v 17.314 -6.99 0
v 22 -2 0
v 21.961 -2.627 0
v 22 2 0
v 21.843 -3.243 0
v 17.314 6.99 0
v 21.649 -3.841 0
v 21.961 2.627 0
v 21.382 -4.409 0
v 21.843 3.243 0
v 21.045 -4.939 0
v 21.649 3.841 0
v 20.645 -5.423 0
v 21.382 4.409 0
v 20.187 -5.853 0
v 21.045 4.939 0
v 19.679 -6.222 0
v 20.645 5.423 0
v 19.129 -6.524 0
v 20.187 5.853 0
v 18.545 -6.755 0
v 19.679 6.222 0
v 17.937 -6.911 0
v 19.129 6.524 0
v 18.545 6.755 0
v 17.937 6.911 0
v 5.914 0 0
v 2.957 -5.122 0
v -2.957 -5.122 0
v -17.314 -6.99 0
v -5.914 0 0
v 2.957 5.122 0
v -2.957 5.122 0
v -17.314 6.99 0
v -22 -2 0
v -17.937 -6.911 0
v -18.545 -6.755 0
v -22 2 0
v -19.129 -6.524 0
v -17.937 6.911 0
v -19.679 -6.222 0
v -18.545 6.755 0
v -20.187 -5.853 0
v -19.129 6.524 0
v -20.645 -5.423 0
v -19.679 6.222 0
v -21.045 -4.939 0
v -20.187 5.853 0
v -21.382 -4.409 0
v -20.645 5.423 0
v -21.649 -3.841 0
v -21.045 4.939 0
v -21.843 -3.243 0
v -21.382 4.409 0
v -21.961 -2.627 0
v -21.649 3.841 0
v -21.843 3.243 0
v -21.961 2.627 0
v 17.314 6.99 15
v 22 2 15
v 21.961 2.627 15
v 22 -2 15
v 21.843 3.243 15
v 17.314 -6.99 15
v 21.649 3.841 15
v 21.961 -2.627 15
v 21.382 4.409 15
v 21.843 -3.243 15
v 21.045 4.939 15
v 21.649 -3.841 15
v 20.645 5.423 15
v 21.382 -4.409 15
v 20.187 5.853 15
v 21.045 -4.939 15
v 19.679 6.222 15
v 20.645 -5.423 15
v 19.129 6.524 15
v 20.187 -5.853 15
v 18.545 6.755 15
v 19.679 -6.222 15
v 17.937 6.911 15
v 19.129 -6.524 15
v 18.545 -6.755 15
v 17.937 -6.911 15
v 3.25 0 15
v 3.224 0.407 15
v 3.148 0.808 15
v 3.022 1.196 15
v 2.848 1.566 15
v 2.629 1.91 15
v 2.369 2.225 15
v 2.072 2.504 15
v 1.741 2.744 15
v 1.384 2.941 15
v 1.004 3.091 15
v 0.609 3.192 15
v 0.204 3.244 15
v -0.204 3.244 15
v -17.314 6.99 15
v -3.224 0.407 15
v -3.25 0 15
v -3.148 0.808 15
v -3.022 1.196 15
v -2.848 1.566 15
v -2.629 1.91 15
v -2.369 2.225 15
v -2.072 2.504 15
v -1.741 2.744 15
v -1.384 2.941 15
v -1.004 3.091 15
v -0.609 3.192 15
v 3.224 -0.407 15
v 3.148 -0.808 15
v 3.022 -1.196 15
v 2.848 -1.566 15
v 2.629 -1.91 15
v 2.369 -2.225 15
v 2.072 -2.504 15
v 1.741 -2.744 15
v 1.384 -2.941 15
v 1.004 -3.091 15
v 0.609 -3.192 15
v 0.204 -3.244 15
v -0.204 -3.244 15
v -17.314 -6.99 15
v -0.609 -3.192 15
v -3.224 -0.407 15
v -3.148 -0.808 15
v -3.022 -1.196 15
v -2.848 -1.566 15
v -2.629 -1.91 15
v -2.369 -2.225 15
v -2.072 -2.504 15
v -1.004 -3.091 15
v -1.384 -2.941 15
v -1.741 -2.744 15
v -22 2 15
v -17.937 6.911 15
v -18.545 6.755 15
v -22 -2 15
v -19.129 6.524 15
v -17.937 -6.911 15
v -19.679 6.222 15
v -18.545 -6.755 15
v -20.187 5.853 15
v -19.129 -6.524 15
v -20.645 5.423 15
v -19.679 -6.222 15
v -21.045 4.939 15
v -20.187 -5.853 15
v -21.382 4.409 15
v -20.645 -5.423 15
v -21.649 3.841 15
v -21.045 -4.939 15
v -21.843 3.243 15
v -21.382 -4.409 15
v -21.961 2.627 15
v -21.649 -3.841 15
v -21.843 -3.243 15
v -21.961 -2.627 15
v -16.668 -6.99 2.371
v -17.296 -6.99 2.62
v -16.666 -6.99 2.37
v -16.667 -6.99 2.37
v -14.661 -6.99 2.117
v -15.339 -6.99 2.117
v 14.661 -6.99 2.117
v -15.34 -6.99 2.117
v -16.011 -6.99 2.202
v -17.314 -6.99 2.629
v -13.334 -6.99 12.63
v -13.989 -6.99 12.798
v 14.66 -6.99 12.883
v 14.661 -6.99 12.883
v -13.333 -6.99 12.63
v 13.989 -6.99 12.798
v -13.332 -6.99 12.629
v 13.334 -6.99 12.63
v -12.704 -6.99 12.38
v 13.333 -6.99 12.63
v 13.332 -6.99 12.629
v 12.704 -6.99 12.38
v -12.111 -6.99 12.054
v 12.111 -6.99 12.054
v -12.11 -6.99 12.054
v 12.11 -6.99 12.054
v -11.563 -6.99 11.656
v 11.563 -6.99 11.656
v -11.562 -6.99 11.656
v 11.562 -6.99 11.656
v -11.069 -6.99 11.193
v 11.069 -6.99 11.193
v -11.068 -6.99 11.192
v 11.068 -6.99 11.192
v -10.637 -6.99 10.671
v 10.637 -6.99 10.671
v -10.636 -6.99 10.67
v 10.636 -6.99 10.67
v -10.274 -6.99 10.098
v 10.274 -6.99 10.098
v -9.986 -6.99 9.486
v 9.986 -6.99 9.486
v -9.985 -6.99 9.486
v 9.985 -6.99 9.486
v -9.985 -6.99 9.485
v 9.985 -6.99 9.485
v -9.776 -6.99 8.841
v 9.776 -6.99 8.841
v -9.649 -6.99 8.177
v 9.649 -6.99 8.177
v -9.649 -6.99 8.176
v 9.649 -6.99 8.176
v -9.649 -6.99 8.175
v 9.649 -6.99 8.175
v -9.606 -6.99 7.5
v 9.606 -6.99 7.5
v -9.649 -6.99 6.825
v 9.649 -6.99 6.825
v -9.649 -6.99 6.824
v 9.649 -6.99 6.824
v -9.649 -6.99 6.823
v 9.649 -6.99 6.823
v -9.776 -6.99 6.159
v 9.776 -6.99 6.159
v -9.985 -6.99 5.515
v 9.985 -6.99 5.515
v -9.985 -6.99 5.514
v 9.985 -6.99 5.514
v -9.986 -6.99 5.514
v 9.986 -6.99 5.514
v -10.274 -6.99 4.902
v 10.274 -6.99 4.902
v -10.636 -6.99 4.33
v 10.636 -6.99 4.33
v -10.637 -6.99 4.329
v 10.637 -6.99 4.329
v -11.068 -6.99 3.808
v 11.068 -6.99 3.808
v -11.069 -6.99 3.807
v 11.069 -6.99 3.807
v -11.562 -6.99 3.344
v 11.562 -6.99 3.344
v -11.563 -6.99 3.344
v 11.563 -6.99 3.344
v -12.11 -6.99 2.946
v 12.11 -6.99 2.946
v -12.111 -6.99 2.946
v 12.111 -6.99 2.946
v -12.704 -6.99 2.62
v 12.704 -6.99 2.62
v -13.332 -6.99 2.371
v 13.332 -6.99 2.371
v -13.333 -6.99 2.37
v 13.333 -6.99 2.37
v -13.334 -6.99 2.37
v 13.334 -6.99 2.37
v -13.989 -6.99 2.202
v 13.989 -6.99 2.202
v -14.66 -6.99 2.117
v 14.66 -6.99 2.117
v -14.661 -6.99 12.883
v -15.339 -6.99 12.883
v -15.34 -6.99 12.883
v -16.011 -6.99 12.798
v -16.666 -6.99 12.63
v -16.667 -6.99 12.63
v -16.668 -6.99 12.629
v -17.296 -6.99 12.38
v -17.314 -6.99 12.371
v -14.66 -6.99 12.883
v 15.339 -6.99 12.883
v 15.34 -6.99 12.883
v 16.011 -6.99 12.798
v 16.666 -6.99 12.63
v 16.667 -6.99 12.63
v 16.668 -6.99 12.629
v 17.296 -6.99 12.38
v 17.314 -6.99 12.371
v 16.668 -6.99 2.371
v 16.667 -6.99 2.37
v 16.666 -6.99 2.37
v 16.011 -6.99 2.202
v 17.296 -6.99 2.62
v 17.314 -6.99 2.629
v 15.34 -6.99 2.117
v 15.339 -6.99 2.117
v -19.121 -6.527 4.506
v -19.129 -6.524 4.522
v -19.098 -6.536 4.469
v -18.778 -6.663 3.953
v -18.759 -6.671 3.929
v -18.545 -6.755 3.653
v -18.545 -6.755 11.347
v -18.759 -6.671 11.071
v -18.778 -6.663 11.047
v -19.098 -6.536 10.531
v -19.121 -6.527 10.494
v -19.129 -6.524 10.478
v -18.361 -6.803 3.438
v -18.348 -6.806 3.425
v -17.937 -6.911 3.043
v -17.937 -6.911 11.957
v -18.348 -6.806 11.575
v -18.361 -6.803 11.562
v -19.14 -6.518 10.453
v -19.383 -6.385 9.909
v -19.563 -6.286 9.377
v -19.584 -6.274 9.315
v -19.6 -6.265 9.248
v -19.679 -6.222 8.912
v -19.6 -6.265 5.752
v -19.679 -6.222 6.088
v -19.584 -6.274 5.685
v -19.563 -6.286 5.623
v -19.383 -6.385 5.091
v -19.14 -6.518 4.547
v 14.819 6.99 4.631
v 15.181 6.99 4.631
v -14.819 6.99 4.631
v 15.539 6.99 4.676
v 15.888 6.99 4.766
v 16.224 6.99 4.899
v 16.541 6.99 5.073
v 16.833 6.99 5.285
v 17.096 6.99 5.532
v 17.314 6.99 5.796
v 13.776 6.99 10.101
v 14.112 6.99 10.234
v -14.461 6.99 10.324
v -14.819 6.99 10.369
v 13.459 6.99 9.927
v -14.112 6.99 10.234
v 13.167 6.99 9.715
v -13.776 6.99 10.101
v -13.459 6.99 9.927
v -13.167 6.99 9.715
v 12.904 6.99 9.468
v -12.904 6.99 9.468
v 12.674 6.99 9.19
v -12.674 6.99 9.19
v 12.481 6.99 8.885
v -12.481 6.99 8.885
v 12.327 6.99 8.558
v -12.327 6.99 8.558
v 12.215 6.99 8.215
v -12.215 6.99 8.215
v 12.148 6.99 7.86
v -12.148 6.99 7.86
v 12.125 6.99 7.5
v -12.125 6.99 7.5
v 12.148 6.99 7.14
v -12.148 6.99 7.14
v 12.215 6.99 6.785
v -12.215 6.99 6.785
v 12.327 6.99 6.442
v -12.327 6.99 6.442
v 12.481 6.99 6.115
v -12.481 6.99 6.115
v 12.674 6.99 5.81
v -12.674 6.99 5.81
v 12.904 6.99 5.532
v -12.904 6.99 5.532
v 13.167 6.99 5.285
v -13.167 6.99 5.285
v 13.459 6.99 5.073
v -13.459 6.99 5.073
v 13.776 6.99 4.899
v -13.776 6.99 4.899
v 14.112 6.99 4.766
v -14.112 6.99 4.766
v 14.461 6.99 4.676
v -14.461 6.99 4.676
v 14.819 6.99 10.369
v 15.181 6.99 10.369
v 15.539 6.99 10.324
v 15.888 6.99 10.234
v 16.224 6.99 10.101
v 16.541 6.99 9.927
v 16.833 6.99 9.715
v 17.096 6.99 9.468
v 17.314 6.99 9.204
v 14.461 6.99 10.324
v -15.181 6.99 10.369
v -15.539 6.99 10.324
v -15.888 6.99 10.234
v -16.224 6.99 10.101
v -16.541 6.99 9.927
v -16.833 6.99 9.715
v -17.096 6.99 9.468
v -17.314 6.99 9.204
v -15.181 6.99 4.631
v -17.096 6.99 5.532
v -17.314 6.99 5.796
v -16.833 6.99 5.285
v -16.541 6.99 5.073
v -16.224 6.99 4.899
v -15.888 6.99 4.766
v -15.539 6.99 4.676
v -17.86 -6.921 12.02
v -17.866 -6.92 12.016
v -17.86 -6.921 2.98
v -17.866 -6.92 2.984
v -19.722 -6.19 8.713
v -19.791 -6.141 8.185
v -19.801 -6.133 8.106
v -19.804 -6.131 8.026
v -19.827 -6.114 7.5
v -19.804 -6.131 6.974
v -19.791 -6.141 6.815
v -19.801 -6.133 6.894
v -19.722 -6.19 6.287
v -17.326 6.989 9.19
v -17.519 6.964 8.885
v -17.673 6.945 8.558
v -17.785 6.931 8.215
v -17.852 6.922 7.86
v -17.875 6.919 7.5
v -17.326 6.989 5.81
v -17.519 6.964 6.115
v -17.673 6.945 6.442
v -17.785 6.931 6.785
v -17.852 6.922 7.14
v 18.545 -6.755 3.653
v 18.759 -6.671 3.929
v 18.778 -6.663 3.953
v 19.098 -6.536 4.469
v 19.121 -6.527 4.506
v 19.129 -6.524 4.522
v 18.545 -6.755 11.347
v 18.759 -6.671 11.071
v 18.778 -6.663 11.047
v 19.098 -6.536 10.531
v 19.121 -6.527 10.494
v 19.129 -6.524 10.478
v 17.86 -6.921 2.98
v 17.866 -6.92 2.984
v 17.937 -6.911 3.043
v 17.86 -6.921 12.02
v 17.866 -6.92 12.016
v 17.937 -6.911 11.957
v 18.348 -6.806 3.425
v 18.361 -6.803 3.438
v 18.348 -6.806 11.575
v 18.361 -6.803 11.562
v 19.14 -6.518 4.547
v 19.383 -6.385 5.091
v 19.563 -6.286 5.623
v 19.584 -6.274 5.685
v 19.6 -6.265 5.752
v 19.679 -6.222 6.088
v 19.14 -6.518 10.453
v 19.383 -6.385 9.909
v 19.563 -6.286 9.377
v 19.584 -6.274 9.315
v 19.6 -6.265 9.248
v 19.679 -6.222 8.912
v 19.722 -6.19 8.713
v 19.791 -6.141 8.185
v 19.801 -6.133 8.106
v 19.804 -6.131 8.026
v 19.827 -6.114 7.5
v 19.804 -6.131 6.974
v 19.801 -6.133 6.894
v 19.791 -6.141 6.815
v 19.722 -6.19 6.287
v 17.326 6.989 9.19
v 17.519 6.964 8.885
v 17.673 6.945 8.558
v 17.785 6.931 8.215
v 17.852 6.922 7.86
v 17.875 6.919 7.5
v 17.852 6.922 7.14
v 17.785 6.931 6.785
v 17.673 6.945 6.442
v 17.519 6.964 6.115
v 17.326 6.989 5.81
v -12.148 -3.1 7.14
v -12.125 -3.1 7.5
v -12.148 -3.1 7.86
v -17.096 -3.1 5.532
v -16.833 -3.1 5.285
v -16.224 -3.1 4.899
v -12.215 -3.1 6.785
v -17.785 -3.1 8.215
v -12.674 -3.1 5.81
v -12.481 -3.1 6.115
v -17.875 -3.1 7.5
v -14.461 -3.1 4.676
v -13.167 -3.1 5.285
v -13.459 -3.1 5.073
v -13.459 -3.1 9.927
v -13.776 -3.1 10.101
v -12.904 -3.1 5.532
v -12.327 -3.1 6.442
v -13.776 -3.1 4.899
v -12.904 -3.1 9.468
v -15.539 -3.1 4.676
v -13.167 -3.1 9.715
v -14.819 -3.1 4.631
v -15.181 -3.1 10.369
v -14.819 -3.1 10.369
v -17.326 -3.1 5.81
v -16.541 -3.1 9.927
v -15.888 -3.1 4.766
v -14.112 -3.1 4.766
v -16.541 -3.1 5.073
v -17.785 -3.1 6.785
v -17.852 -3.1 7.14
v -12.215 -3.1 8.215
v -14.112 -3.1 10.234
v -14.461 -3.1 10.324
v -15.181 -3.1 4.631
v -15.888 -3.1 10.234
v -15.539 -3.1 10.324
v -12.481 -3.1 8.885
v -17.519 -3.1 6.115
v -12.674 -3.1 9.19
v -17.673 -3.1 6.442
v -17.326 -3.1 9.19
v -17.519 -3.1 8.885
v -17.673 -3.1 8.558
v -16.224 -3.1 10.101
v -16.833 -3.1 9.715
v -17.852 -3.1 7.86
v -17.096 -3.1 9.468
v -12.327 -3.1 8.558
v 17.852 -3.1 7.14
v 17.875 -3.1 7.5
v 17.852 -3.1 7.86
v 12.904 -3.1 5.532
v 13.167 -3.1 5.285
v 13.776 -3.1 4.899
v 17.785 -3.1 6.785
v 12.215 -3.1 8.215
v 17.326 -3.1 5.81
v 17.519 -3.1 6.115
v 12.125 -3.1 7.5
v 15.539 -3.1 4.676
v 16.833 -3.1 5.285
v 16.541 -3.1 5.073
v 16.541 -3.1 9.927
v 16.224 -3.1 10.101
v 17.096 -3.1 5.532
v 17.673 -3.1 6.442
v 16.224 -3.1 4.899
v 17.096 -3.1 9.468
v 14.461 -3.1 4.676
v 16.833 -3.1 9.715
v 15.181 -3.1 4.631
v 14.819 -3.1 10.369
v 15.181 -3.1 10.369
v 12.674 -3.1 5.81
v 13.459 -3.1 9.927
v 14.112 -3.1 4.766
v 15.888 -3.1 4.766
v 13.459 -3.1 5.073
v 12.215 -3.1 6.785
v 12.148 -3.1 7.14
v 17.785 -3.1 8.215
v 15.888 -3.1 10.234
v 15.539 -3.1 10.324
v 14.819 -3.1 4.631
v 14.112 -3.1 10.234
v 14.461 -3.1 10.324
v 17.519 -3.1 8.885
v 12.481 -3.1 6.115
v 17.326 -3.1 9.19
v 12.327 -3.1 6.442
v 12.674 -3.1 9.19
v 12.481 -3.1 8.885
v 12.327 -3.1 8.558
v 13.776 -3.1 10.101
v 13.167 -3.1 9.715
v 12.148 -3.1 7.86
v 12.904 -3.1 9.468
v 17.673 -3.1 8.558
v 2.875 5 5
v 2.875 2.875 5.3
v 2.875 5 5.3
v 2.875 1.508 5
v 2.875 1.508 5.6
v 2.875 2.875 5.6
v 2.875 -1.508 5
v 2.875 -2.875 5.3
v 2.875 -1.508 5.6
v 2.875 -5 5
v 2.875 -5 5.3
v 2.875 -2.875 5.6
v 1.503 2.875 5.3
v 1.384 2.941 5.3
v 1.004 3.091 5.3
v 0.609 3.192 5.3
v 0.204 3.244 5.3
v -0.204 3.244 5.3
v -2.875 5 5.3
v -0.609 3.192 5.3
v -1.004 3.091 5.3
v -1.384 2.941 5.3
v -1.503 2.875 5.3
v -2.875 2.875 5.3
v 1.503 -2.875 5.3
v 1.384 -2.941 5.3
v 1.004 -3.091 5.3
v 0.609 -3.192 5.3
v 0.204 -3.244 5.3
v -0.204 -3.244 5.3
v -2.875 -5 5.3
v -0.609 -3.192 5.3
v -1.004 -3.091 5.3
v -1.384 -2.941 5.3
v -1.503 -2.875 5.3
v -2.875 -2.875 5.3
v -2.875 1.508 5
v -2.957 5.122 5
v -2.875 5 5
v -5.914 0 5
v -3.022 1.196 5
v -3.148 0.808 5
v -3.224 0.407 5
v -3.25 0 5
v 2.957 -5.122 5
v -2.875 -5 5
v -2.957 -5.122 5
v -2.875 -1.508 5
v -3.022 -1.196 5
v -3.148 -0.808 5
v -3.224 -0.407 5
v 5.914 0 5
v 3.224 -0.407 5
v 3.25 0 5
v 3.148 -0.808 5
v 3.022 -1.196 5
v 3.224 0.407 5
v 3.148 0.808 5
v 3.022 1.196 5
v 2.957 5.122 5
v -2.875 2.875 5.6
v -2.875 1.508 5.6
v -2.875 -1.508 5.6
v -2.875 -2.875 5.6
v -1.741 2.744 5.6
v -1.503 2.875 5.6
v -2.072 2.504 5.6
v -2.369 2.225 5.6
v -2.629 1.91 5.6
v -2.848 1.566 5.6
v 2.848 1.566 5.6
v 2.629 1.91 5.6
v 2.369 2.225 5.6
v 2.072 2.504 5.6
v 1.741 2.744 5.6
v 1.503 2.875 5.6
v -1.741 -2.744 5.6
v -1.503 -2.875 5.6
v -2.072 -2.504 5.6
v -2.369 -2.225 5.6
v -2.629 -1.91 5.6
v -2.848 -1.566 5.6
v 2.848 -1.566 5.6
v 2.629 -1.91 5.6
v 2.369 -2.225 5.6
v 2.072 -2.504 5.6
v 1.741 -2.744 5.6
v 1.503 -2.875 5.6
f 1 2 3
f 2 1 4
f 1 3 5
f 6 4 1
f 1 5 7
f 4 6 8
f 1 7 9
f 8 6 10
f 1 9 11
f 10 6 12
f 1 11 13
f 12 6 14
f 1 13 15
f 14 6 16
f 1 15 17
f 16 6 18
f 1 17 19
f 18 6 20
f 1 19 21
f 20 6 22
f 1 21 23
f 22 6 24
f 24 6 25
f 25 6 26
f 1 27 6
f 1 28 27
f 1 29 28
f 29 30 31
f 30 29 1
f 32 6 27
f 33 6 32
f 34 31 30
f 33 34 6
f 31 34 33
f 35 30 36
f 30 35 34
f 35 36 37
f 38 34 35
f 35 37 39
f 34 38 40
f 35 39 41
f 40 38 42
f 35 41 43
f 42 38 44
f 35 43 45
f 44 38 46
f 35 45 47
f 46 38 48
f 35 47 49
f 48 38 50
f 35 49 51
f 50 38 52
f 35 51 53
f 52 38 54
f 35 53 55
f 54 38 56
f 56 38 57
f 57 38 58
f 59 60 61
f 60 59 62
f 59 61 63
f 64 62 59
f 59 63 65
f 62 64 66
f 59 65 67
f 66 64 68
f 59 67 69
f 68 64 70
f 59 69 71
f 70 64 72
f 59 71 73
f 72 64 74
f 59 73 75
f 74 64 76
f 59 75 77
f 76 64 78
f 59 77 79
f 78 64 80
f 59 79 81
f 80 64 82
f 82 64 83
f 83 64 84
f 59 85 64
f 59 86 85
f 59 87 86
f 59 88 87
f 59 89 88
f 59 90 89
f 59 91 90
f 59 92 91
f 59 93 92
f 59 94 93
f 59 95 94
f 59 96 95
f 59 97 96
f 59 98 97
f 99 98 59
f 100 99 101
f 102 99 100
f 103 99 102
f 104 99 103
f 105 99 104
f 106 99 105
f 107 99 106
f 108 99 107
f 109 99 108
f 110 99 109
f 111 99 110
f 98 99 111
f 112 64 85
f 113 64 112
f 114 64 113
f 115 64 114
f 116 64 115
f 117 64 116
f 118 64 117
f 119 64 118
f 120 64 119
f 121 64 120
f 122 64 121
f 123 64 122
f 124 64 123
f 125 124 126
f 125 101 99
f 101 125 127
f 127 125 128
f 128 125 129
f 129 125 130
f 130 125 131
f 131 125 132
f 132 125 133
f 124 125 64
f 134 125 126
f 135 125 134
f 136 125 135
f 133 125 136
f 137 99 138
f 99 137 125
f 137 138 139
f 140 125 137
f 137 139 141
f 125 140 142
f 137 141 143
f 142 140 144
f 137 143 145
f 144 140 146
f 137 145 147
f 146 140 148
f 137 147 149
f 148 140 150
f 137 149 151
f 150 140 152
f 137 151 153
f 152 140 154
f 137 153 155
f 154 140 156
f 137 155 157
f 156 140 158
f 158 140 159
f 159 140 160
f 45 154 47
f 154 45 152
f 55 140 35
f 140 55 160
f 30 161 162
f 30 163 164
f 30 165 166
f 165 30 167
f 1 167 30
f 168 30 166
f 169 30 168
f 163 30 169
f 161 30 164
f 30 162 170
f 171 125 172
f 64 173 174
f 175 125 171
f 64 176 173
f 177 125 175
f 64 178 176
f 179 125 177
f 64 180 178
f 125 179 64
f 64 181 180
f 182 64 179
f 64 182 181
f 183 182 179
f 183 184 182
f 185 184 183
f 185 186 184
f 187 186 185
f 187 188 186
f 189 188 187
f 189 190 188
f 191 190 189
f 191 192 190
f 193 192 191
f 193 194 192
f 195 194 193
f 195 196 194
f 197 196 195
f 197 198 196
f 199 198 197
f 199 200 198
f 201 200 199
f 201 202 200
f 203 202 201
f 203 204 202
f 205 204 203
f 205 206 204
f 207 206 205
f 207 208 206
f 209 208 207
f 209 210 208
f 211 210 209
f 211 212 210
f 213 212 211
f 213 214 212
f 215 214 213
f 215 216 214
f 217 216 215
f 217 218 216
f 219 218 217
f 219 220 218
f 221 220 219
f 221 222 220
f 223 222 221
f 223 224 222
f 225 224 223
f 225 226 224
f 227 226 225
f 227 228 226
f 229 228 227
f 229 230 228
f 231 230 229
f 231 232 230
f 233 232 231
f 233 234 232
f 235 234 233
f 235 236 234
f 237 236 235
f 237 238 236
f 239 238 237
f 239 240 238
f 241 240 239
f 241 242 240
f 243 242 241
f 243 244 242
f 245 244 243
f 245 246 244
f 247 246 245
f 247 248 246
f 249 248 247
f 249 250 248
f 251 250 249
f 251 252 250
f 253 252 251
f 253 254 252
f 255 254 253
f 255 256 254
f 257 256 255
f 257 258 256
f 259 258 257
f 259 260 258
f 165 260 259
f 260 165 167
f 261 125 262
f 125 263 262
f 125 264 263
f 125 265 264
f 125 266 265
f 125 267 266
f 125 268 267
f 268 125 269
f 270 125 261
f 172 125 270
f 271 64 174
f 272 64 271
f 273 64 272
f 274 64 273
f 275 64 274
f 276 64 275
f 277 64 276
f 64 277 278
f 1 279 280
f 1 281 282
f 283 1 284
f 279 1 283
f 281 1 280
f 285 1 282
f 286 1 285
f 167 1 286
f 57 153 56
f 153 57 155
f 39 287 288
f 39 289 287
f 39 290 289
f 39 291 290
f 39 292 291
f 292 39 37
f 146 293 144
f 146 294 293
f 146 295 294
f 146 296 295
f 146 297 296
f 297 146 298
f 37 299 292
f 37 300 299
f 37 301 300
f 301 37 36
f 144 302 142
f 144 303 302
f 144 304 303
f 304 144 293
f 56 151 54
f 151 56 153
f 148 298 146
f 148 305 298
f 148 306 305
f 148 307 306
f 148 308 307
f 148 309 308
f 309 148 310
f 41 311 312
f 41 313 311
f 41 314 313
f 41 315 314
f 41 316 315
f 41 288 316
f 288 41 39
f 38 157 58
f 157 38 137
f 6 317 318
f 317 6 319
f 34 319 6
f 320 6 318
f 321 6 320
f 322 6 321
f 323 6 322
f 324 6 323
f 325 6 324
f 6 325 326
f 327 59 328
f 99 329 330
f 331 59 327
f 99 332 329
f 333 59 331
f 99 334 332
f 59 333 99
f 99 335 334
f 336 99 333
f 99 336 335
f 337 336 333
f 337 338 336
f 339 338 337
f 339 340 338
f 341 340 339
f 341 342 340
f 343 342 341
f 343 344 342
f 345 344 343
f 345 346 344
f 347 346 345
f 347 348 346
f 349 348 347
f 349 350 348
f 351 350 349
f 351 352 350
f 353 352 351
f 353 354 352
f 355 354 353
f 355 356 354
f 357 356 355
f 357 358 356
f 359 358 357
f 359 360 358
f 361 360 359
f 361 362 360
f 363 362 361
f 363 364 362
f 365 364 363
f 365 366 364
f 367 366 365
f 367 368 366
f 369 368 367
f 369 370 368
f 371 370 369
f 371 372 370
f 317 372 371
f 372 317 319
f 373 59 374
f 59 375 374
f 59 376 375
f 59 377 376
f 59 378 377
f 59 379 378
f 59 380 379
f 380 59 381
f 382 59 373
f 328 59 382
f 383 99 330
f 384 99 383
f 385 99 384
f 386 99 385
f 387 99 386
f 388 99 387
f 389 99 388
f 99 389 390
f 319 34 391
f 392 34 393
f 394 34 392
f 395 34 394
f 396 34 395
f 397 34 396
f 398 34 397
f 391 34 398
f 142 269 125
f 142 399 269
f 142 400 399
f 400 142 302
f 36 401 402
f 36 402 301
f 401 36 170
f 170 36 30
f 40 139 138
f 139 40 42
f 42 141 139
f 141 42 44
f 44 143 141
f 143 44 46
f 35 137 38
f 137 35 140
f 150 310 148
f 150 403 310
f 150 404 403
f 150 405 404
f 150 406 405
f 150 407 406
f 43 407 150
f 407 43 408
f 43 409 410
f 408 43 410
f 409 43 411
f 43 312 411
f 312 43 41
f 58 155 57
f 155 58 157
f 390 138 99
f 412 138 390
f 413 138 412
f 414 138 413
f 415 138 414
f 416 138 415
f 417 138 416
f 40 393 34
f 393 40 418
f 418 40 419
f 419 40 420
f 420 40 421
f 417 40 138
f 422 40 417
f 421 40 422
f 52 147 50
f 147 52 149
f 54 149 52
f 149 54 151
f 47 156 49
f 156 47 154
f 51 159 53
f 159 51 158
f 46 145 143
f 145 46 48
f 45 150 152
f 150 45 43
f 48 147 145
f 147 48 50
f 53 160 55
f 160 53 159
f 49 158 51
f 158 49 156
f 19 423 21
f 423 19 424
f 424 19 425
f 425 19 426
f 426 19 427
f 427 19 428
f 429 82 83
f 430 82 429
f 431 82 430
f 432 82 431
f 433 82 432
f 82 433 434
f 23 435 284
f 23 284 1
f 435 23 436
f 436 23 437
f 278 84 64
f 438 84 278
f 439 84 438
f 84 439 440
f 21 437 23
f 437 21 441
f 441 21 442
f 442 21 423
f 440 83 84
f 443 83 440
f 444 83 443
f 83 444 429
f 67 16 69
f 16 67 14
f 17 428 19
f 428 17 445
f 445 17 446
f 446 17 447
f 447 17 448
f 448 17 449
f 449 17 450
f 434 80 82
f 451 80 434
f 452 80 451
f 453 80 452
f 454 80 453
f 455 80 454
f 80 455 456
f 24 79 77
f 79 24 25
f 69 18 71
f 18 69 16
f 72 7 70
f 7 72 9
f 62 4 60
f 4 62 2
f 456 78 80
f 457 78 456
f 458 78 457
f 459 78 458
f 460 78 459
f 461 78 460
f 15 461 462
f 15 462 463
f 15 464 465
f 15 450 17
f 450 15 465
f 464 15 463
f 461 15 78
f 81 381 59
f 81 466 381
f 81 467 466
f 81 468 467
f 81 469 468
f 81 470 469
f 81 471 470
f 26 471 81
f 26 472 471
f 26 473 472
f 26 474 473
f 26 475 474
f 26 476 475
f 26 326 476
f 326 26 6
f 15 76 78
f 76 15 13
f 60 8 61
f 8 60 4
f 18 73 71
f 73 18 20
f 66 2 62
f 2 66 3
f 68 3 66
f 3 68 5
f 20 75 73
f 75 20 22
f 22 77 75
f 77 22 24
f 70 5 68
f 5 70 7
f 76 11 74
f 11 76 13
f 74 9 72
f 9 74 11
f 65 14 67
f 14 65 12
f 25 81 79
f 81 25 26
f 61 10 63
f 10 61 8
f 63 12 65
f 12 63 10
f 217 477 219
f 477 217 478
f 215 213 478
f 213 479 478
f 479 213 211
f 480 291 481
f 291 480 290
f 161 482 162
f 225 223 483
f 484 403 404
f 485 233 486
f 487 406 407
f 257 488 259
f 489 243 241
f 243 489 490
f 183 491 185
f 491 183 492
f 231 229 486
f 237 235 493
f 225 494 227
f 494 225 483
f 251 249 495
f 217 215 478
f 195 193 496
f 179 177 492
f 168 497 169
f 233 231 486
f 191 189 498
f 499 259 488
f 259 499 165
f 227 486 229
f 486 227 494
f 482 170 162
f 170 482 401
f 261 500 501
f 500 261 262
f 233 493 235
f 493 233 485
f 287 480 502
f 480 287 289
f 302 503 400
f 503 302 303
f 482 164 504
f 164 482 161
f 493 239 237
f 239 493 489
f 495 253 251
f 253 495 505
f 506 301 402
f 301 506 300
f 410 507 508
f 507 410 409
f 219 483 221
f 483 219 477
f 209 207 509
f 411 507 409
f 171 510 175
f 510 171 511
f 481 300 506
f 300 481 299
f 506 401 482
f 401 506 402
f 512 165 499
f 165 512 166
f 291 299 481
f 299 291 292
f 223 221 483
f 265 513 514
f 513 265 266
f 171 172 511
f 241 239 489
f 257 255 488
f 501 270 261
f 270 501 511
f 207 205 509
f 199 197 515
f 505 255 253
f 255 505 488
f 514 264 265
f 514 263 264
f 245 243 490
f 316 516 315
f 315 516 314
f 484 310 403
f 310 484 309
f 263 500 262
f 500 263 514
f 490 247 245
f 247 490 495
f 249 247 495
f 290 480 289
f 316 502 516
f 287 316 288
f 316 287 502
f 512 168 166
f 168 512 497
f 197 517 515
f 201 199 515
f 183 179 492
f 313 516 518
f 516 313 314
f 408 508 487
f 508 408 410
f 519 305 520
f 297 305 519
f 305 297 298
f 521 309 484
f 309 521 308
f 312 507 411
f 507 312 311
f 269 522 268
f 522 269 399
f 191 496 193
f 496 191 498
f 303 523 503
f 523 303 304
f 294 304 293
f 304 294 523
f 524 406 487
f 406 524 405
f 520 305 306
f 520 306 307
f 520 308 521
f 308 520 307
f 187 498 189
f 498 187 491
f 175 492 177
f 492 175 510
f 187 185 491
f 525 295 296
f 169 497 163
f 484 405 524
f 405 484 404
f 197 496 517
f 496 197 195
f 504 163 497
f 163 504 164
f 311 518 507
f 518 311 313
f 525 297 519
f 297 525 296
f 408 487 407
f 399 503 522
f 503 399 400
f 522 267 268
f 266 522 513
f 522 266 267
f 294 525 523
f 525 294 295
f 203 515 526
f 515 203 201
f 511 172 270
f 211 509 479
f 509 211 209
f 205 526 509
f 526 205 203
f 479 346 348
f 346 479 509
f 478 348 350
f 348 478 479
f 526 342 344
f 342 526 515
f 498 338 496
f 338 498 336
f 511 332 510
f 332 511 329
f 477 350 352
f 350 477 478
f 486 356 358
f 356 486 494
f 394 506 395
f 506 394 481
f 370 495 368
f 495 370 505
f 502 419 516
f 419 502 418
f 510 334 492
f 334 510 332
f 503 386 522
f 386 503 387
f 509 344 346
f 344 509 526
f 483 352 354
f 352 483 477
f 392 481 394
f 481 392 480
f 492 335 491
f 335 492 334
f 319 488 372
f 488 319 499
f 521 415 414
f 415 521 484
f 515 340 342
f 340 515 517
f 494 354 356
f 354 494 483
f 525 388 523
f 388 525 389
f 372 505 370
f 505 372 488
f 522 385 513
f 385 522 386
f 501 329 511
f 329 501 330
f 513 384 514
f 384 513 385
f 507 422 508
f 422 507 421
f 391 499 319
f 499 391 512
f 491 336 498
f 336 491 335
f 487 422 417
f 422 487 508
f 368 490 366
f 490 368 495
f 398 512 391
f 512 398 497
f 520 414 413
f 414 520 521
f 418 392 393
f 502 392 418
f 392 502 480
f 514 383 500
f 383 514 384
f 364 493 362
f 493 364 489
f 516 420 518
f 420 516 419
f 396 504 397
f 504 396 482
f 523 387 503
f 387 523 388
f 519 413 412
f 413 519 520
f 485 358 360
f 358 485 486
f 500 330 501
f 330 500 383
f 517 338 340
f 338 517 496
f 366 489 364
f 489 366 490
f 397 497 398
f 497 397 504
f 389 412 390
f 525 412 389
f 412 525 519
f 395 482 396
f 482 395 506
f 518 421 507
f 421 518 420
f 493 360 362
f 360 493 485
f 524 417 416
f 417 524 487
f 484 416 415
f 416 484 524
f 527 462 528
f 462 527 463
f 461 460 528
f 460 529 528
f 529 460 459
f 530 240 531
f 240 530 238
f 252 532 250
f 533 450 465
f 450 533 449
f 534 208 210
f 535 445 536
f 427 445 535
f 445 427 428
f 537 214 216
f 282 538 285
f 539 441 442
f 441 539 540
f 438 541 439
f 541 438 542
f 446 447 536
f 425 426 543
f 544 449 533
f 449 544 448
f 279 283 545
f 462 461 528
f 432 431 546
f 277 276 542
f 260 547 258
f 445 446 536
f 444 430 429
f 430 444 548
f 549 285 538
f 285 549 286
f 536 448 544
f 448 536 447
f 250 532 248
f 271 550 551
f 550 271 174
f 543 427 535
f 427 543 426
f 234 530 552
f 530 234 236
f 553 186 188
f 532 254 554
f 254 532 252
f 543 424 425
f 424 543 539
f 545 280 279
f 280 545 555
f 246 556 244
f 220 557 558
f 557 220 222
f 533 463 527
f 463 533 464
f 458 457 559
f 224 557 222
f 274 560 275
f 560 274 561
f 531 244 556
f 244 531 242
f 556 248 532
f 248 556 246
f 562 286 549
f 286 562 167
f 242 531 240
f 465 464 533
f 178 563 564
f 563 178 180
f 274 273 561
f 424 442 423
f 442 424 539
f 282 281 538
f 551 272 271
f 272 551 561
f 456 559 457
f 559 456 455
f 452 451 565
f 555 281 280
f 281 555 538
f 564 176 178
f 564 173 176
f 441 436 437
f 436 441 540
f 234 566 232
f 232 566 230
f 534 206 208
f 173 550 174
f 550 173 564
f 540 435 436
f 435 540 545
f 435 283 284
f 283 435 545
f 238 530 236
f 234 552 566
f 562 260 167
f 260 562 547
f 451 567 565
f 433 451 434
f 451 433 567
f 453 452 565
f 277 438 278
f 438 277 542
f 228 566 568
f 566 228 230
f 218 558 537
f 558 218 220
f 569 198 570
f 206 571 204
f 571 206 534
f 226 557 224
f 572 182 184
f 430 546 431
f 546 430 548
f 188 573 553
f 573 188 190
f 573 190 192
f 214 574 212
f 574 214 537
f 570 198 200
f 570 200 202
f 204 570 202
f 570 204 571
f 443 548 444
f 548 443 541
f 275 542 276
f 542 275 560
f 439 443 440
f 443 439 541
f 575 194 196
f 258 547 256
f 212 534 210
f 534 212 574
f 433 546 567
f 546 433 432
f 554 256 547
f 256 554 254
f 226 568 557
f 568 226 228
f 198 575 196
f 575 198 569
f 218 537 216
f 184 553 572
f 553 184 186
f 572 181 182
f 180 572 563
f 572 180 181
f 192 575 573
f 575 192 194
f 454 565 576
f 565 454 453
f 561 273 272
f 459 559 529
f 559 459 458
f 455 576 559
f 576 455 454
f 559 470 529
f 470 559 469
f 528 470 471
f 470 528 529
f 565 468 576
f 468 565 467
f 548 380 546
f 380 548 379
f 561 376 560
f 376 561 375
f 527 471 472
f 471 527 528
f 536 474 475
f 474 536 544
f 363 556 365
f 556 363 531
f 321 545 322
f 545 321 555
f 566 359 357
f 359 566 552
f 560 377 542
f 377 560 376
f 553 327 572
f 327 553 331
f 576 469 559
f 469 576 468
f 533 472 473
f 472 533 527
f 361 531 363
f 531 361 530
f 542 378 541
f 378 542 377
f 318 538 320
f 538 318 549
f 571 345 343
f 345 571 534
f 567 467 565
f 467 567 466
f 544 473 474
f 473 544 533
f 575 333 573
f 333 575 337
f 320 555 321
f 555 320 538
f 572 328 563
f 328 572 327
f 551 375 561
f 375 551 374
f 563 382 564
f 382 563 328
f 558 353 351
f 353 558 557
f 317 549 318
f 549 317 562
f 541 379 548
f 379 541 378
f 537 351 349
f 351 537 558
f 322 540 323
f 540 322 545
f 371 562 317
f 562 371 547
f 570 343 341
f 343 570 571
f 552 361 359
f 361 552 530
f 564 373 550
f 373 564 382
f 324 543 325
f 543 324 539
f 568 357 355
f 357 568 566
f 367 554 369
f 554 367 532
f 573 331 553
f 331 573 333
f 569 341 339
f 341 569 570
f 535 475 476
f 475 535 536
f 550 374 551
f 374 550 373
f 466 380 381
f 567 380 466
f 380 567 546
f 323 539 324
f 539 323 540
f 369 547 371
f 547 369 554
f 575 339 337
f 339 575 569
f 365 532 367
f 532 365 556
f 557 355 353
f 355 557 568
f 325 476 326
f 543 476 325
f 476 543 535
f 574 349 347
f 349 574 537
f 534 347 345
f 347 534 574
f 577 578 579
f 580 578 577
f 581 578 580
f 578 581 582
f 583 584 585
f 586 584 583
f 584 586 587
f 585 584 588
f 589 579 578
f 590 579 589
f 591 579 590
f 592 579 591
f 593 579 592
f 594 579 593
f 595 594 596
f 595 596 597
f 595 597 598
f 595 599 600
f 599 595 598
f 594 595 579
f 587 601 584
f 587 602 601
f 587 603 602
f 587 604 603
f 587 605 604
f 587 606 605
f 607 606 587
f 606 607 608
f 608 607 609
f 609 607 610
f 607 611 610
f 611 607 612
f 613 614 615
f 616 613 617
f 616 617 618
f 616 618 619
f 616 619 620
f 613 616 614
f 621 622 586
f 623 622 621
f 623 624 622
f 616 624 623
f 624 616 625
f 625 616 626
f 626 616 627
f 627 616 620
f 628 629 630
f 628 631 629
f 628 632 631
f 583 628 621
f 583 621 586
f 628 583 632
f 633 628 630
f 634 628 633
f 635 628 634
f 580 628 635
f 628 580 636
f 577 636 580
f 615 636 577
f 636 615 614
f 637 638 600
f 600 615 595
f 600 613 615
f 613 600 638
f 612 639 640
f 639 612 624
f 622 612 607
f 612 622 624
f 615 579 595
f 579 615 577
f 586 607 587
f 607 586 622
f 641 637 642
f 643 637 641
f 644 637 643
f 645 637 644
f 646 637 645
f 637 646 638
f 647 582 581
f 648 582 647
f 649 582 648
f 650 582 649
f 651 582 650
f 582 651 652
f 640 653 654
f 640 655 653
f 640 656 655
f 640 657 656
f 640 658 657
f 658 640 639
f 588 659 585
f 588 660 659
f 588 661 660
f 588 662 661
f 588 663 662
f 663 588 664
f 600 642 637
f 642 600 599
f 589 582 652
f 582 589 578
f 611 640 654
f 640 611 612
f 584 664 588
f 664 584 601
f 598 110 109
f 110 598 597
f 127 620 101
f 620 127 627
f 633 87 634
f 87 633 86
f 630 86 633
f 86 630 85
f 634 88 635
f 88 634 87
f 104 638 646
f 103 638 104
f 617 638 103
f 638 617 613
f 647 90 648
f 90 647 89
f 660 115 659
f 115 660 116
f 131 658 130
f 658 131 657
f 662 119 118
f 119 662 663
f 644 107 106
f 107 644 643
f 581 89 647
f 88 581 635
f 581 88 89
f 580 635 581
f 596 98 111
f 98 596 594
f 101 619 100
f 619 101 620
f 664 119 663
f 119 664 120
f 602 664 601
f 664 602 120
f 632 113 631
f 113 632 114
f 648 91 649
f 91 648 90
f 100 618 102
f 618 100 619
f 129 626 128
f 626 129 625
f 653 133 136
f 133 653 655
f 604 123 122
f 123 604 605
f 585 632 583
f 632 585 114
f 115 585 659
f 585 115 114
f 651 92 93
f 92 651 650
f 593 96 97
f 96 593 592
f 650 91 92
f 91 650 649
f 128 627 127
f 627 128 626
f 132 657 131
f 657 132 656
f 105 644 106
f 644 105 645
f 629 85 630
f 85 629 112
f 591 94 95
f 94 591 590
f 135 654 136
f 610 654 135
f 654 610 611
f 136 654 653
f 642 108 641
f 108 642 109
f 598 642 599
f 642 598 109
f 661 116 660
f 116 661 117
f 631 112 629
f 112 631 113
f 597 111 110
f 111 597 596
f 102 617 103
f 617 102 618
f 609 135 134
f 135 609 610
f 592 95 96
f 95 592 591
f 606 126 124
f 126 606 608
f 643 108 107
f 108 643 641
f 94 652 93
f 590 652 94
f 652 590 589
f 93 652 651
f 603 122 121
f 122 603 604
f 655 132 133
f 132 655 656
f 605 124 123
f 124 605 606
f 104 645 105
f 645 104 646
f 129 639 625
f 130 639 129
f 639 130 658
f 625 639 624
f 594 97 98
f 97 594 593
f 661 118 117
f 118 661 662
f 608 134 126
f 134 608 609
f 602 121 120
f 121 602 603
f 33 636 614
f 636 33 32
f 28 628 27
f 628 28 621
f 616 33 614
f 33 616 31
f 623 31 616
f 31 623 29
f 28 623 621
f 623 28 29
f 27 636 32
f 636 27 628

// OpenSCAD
$fn = 50;


difference() {
	union() {
		cylinder(h = 15, r = 7.0000000000);
		translate(v = [-7.5000000000, 0.0000000000, 0]) {
			hull() {
				translate(v = [-9.5000000000, 2.0000000000, 0]) {
					cylinder(h = 15, r = 5);
				}
				translate(v = [9.5000000000, 2.0000000000, 0]) {
					cylinder(h = 15, r = 5);
				}
				translate(v = [-9.5000000000, -2.0000000000, 0]) {
					cylinder(h = 15, r = 5);
				}
				translate(v = [9.5000000000, -2.0000000000, 0]) {
					cylinder(h = 15, r = 5);
				}
			}
		}
		translate(v = [-7.5000000000, 0.0000000000, 0]) {
			hull() {
				translate(v = [-9.5000000000, 2.0000000000, 0]) {
					cylinder(h = 15, r = 5);
				}
				translate(v = [9.5000000000, 2.0000000000, 0]) {
					cylinder(h = 15, r = 5);
				}
				translate(v = [-9.5000000000, -2.0000000000, 0]) {
					cylinder(h = 15, r = 5);
				}
				translate(v = [9.5000000000, -2.0000000000, 0]) {
					cylinder(h = 15, r = 5);
				}
			}
		}
		translate(v = [7.5000000000, 0.0000000000, 0]) {
			hull() {
				translate(v = [-9.5000000000, 2.0000000000, 0]) {
					cylinder(h = 15, r = 5);
				}
				translate(v = [9.5000000000, 2.0000000000, 0]) {
					cylinder(h = 15, r = 5);
				}
				translate(v = [-9.5000000000, -2.0000000000, 0]) {
					cylinder(h = 15, r = 5);
				}
				translate(v = [9.5000000000, -2.0000000000, 0]) {
					cylinder(h = 15, r = 5);
				}
			}
		}
		translate(v = [7.5000000000, 0.0000000000, 0]) {
			hull() {
				translate(v = [-9.5000000000, 2.0000000000, 0]) {
					cylinder(h = 15, r = 5);
				}
				translate(v = [9.5000000000, 2.0000000000, 0]) {
					cylinder(h = 15, r = 5);
				}
				translate(v = [-9.5000000000, -2.0000000000, 0]) {
					cylinder(h = 15, r = 5);
				}
				translate(v = [9.5000000000, -2.0000000000, 0]) {
					cylinder(h = 15, r = 5);
				}
			}
		}
	}
	union() {
		translate(v = [-15.0000000000, -7.0000000000, 7.5000000000]) {
			rotate(a = [90, 0, 0]) {
				difference() {
					union() {
						#translate(v = [0, 0, -14.0000000000]) {
							cylinder(h = 14, r = 2.6000000000);
						}
						#translate(v = [0, 0, -3.9000000000]) {
							cylinder(h = 3.9000000000, r1 = 2.8750000000, r2 = 5.4000000000);
						}
						#translate(v = [0, 0, -14.0000000000]) {
							cylinder(h = 14, r = 2.8750000000);
						}
						#translate(v = [0, 0, -14.0000000000]) {
							cylinder(h = 14, r = 2.6000000000);
						}
					}
					union();
				}
			}
		}
		translate(v = [15.0000000000, -7.0000000000, 7.5000000000]) {
			rotate(a = [90, 0, 0]) {
				difference() {
					union() {
						#translate(v = [0, 0, -14.0000000000]) {
							cylinder(h = 14, r = 2.6000000000);
						}
						#translate(v = [0, 0, -3.9000000000]) {
							cylinder(h = 3.9000000000, r1 = 2.8750000000, r2 = 5.4000000000);
						}
						#translate(v = [0, 0, -14.0000000000]) {
							cylinder(h = 14, r = 2.8750000000);
						}
						#translate(v = [0, 0, -14.0000000000]) {
							cylinder(h = 14, r = 2.6000000000);
						}
					}
					union();
				}
			}
		}
		translate(v = [0.0000000000, 0.0000000000, 0]) {
			rotate(a = [0, 0, 0]) {
				difference() {
					union() {
						#translate(v = [-2.8750000000, -5.0000000000, -0.3000000000]) {
							cube(size = [5.7500000000, 10, 0.3000000000]);
						}
						#translate(v = [-2.8750000000, -2.8750000000, -0.6000000000]) {
							cube(size = [5.7500000000, 5.7500000000, 0.3000000000]);
						}
						#translate(v = [-2.8750000000, -5.0000000000, 5]) {
							cube(size = [5.7500000000, 10, 0.3000000000]);
						}
						#translate(v = [-2.8750000000, -2.8750000000, 5.3000000000]) {
							cube(size = [5.7500000000, 5.7500000000, 0.3000000000]);
						}
						#translate(v = [0, 0, -100.0000000000]) {
							cylinder(h = 200, r = 3.2500000000);
						}
						#linear_extrude(height = 5) {
							polygon(points = [[5.9142500000, 0.0000000000], [2.9571250000, 5.1218907443], [-2.9571250000, 5.1218907443], [-5.9142500000, 0.0000000000], [-2.9571250000, -5.1218907443], [2.9571250000, -5.1218907443]]);
						}
						#translate(v = [-2.8750000000, -5.0000000000, -0.3000000000]) {
							cube(size = [5.7500000000, 10, 0.3000000000]);
						}
						#translate(v = [-2.8750000000, -2.8750000000, -0.6000000000]) {
							cube(size = [5.7500000000, 5.7500000000, 0.3000000000]);
						}
						#translate(v = [-2.8750000000, -5.0000000000, 5]) {
							cube(size = [5.7500000000, 10, 0.3000000000]);
						}
						#translate(v = [-2.8750000000, -2.8750000000, 5.3000000000]) {
							cube(size = [5.7500000000, 5.7500000000, 0.3000000000]);
						}
						#translate(v = [0, 0, -100.0000000000]) {
							cylinder(h = 200, r = 3.2500000000);
						}
						#translate(v = [-2.8750000000, -5.0000000000, -0.3000000000]) {
							cube(size = [5.7500000000, 10, 0.3000000000]);
						}
						#translate(v = [-2.8750000000, -2.8750000000, -0.6000000000]) {
							cube(size = [5.7500000000, 5.7500000000, 0.3000000000]);
						}
						#translate(v = [-2.8750000000, -5.0000000000, 5]) {
							cube(size = [5.7500000000, 10, 0.3000000000]);
						}
						#translate(v = [-2.8750000000, -2.8750000000, 5.3000000000]) {
							cube(size = [5.7500000000, 5.7500000000, 0.3000000000]);
						}
						#translate(v = [0, 0, -100.0000000000]) {
							cylinder(h = 200, r = 3.2500000000);
						}
					}
					union();
				}
			}
		}
		translate(v = [0, 0, -100]) {
			cylinder(h = 200, r = 3.2500000000);
		}
		translate(v = [0, 0, -100]) {
			cylinder(h = 200, r = 1.8000000000);
		}
	}
}
